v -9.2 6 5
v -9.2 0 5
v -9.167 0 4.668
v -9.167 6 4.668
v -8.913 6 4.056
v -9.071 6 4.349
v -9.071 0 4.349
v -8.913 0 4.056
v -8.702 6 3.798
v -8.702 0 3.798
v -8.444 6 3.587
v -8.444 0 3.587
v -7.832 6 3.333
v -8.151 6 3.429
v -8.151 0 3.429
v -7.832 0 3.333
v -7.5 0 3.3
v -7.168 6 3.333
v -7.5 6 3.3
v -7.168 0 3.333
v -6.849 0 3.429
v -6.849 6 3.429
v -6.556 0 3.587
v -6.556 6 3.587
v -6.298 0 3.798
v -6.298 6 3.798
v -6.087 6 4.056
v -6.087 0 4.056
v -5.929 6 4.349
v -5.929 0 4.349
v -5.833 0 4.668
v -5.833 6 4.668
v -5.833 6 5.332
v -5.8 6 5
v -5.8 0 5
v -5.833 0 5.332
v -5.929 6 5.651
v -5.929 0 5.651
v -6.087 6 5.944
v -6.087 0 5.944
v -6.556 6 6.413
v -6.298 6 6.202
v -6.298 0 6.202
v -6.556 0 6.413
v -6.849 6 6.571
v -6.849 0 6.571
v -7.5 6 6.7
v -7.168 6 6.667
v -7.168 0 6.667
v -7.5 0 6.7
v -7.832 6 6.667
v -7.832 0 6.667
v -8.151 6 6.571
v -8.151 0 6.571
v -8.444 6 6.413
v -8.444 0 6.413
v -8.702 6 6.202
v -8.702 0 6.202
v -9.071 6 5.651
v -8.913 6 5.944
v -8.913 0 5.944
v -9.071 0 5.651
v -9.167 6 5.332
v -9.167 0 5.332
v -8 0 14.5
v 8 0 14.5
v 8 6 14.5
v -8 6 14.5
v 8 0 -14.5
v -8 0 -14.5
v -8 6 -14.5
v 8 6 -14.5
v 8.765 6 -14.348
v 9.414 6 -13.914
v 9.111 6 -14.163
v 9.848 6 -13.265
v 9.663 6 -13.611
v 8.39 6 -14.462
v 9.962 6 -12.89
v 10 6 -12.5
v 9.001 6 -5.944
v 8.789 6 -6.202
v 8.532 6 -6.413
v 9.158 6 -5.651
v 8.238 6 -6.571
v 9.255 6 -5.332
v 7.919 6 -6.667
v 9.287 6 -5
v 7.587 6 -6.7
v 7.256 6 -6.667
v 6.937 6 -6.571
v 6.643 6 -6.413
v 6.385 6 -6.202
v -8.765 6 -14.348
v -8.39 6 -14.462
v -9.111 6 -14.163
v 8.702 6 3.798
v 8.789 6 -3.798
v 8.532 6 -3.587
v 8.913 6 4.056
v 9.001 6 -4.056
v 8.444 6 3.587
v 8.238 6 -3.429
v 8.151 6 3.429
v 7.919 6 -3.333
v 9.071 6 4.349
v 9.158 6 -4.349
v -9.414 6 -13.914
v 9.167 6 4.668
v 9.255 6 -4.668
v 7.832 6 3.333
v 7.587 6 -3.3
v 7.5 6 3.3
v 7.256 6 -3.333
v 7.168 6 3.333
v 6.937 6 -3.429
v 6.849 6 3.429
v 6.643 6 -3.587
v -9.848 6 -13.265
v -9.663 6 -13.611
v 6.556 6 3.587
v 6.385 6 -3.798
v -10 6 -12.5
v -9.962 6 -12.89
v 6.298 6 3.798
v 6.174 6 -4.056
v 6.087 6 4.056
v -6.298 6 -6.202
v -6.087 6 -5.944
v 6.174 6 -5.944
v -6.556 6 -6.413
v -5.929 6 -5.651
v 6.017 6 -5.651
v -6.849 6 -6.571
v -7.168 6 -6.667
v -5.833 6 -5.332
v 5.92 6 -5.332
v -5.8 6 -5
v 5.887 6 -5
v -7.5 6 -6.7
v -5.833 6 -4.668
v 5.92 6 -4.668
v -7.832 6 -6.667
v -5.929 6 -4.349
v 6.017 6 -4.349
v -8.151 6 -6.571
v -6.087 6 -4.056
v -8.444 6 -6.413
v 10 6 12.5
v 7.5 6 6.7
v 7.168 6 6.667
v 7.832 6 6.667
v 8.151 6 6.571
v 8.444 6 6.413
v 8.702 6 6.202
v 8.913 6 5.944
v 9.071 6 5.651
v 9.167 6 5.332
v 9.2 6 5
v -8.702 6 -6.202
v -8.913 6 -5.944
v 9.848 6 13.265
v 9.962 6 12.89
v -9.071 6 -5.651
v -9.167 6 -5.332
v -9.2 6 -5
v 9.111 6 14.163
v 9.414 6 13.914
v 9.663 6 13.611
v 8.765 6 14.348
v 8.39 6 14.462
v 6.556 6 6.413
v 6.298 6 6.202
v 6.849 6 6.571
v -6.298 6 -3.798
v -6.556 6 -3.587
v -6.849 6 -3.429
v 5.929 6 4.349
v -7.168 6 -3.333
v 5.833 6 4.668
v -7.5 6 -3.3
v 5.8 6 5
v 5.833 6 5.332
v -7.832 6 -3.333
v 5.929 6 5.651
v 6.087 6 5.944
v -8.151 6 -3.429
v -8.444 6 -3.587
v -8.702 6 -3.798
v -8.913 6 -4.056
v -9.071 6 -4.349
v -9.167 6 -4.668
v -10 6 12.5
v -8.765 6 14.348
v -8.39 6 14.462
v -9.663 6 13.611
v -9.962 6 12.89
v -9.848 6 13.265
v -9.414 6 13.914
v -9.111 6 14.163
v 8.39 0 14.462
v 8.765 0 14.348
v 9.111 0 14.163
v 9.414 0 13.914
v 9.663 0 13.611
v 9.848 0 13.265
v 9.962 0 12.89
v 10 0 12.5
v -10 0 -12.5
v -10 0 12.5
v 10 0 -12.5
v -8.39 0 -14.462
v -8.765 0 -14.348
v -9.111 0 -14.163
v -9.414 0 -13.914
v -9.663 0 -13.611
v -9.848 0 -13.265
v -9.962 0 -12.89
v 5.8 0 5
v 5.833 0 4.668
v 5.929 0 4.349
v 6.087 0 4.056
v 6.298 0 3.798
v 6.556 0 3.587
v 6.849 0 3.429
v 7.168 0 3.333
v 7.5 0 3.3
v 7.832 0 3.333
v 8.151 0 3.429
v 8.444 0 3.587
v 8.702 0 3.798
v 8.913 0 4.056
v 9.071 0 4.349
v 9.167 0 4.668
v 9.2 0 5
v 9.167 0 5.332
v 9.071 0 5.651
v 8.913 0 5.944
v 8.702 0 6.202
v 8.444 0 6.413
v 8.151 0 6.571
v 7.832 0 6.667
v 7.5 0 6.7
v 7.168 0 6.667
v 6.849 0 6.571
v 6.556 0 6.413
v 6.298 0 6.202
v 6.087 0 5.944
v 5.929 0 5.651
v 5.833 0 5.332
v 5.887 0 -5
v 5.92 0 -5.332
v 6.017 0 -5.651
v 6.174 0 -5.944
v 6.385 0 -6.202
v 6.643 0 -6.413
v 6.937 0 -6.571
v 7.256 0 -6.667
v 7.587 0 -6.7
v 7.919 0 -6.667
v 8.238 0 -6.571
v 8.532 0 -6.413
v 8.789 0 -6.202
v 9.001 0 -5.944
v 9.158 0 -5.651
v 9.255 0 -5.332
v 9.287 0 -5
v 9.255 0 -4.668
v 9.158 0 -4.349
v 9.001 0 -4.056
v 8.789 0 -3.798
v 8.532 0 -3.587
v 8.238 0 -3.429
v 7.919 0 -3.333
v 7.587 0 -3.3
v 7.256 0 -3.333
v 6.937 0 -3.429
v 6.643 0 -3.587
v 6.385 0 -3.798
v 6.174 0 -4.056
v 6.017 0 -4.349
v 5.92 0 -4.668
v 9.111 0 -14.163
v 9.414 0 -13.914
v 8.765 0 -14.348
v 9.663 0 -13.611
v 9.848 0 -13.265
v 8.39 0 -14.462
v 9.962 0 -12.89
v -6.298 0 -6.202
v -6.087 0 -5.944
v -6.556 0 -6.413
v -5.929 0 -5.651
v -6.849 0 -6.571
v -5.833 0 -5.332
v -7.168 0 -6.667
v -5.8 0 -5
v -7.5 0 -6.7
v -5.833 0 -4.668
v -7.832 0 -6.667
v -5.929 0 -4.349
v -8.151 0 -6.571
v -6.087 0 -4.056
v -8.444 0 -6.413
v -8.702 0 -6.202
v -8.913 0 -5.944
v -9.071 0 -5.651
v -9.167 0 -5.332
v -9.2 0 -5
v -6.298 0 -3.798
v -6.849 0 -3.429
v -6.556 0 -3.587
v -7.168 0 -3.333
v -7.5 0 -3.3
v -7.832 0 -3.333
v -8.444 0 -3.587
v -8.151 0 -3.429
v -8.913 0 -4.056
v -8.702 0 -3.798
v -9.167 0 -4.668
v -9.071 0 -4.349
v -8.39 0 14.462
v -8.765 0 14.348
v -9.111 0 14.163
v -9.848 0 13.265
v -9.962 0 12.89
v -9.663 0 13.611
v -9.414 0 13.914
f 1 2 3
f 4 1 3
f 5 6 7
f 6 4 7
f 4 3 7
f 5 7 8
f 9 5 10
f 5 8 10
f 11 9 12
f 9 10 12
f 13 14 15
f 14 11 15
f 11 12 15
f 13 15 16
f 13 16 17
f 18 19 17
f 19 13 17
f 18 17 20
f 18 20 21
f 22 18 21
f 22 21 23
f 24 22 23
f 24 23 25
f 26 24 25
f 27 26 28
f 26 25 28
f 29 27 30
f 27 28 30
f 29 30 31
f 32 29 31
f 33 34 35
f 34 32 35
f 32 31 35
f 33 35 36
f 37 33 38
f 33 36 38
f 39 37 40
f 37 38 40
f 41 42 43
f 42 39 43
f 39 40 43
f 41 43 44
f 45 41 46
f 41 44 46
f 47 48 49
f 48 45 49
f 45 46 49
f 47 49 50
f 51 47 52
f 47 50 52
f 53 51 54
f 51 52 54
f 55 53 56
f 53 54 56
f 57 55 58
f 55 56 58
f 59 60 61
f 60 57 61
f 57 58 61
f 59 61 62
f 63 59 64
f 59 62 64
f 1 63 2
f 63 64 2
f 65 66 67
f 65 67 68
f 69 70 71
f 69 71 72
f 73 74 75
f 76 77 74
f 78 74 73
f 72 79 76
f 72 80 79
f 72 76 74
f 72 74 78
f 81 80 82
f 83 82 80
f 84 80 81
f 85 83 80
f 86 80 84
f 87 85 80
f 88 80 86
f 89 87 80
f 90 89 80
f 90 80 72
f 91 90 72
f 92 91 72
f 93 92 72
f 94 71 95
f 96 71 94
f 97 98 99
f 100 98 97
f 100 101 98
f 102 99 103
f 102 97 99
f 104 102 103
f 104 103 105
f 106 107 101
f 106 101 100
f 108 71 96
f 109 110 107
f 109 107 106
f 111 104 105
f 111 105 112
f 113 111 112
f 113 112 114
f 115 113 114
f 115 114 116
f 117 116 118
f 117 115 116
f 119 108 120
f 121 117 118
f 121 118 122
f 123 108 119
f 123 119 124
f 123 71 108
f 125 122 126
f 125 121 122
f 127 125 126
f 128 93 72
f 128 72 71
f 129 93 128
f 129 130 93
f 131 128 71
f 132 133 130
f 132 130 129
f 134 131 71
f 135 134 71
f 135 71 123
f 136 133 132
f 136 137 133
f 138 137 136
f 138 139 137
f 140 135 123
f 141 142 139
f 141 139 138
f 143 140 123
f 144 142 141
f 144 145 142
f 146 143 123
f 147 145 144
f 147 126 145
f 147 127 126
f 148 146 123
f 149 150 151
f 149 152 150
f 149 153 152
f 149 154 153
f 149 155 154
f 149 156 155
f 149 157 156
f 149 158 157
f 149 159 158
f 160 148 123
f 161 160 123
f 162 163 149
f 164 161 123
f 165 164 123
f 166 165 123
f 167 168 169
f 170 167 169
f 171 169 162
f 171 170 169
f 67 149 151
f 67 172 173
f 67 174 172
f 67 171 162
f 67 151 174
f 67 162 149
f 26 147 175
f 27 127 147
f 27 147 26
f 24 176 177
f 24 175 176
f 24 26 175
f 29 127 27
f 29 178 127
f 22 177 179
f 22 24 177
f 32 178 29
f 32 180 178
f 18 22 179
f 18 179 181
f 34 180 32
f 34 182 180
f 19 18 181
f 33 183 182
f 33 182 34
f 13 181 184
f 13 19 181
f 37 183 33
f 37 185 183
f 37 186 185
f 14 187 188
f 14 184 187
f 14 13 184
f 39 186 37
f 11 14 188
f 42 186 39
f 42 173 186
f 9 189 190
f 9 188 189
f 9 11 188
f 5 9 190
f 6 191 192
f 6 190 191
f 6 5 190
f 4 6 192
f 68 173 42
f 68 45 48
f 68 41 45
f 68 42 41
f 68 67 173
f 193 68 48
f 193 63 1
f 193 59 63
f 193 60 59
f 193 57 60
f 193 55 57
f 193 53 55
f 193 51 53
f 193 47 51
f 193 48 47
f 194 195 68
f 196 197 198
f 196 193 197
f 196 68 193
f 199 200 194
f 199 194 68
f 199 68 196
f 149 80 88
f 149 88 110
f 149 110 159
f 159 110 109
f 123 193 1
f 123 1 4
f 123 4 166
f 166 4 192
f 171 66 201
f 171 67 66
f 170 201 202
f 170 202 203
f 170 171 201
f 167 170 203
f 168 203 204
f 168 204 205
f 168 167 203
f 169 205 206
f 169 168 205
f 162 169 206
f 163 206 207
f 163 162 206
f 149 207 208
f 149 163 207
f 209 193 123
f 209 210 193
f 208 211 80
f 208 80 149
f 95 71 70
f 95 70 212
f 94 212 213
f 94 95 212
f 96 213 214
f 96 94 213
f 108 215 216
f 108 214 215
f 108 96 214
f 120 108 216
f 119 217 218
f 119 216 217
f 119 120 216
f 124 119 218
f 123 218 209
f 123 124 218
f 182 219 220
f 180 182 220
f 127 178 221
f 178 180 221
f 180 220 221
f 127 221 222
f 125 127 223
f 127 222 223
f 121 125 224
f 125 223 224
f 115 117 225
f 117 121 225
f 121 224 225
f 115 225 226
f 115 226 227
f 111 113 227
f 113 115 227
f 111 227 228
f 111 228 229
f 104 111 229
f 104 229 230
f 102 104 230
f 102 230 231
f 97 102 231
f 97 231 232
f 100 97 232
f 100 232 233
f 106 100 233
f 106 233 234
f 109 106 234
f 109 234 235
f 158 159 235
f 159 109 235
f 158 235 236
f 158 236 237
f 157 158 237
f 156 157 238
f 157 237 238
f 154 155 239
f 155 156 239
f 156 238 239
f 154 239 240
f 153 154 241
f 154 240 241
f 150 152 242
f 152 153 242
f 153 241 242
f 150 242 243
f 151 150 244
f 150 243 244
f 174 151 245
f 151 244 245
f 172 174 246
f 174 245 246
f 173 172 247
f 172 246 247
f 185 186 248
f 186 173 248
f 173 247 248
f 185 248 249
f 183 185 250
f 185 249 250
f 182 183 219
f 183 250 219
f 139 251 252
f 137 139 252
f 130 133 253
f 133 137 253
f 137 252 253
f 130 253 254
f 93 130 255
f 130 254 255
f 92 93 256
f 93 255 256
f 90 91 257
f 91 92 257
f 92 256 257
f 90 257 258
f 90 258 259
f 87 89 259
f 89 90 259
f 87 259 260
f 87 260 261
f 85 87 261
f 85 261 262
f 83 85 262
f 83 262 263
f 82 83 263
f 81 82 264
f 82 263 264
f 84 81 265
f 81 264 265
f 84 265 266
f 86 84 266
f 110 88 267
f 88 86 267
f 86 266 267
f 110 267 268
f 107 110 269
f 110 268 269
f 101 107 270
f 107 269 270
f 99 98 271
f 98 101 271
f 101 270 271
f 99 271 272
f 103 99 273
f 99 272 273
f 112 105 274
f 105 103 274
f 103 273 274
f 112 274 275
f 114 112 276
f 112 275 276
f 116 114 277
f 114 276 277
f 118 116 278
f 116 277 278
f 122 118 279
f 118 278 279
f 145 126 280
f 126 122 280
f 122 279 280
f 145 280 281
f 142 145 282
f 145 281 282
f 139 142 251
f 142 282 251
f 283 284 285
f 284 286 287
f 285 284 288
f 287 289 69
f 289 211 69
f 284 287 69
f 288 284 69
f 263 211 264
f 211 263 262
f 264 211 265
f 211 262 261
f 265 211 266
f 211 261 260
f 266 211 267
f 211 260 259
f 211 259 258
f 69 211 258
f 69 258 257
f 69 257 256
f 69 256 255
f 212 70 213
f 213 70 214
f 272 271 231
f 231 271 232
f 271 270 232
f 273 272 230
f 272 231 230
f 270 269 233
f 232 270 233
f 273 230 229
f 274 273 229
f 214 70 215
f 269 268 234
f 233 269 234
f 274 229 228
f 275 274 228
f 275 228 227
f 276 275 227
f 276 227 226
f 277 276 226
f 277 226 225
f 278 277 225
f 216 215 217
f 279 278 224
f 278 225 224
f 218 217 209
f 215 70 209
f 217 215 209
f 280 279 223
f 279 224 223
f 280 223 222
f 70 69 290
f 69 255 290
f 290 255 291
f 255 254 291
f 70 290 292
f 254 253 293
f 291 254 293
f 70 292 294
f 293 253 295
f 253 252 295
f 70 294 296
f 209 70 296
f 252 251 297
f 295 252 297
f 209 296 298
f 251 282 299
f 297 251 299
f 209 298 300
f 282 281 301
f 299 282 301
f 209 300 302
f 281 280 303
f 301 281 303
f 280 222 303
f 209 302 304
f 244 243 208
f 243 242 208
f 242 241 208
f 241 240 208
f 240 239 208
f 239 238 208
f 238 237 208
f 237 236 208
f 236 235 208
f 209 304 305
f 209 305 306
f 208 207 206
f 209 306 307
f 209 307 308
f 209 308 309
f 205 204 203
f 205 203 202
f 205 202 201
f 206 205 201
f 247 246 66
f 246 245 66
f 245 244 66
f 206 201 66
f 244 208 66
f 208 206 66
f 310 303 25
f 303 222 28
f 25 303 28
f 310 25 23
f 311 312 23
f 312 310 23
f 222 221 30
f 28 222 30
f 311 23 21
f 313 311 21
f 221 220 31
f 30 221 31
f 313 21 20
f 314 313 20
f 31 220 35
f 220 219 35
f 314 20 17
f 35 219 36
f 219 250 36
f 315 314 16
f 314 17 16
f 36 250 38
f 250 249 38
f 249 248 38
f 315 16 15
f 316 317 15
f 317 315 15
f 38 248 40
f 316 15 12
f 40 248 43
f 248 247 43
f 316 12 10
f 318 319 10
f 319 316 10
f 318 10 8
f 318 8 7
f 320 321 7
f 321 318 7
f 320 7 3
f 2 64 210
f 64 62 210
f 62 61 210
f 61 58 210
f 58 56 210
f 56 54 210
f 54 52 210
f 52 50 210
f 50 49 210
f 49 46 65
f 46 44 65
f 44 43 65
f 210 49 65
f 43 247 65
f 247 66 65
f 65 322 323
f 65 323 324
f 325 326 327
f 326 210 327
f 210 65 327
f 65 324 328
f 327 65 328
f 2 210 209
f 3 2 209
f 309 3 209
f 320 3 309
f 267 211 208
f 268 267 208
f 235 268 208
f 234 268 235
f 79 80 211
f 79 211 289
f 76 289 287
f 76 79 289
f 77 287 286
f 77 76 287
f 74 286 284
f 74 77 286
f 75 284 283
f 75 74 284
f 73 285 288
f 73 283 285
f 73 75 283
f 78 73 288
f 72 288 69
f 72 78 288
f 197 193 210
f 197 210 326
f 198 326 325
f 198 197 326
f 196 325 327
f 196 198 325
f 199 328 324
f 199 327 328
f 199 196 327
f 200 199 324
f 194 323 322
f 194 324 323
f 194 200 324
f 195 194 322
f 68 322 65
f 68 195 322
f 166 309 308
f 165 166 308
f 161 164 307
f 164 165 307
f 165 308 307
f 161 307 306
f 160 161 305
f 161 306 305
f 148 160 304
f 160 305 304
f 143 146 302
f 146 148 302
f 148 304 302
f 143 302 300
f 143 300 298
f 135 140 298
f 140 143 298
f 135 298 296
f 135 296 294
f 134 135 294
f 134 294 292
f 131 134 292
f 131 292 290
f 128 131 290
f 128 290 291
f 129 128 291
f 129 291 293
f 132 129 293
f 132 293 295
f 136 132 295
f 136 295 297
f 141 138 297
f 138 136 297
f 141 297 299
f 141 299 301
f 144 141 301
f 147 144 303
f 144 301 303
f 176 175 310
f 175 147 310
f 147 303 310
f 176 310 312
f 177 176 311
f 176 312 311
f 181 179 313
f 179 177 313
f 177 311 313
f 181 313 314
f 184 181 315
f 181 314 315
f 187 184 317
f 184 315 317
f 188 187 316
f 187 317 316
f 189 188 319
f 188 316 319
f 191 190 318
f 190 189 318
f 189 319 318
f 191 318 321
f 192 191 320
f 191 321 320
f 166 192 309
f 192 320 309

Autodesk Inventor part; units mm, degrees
ref_plane "YZ Plane" through (0, 0, 0) normal (1, 0, 0) x (0, 1, 0)
ref_plane "XZ Plane" through (0, 0, 0) normal (0, 1, 0) x (-1, 0, 0)
ref_plane "XY Plane" through (0, 0, 0) normal (0, 0, 1) x (1, 0, 0)
sketch "Sketch1" plane through (0, 0, 0) normal (0, 1, 0) x (-1, 0, 0)
  line L0 (-10, 14.5) -> (10, 14.5)
  line L1 (10, 14.5) -> (10, -14.5)
  line L2 (10, -14.5) -> (-10, -14.5)
  line L3 (-10, -14.5) -> (-10, 14.5)
  line L4 (-10, 14.5) -> (10, -14.5) construction
  line L5 (10, 14.5) -> (-10, -14.5) construction
  line L6 (-7.5, 5) -> (7.5, 5) construction
  line L7 (7.5, 5) -> (7.5, -5) construction
  line L8 (7.5, -5) -> (-7.5, -5) construction
  line L9 (-7.5, -5) -> (-7.5, 5) construction
  line L10 (-7.5, 5) -> (7.5, -5) construction
  line L11 (7.5, 5) -> (-7.5, -5) construction
  circle A0 centre (7.5, -5) radius 1.7
  circle A1 centre (-7.5872, -5) radius 1.7
  circle A2 centre (-7.5, 5) radius 1.7
  circle A3 centre (7.5, 5) radius 1.7
  point P0 (0, 0)
  dimension "d0" = 29
  dimension "d1" = 20
  dimension "d2" = 15
  dimension "d3" = 10
  dimension "d4" = 3.4
extrude "Extrusion1" add sketch "Sketch1" along normal blind 6
fillet "Fillet1" radius 2 4 edges at (10, 3, -14.5) (-10, 3, -14.5) (-10, 3, 14.5) (10, 3, 14.5)
properties part number "6mm XY Packer Block" material "ABS Plastic"
